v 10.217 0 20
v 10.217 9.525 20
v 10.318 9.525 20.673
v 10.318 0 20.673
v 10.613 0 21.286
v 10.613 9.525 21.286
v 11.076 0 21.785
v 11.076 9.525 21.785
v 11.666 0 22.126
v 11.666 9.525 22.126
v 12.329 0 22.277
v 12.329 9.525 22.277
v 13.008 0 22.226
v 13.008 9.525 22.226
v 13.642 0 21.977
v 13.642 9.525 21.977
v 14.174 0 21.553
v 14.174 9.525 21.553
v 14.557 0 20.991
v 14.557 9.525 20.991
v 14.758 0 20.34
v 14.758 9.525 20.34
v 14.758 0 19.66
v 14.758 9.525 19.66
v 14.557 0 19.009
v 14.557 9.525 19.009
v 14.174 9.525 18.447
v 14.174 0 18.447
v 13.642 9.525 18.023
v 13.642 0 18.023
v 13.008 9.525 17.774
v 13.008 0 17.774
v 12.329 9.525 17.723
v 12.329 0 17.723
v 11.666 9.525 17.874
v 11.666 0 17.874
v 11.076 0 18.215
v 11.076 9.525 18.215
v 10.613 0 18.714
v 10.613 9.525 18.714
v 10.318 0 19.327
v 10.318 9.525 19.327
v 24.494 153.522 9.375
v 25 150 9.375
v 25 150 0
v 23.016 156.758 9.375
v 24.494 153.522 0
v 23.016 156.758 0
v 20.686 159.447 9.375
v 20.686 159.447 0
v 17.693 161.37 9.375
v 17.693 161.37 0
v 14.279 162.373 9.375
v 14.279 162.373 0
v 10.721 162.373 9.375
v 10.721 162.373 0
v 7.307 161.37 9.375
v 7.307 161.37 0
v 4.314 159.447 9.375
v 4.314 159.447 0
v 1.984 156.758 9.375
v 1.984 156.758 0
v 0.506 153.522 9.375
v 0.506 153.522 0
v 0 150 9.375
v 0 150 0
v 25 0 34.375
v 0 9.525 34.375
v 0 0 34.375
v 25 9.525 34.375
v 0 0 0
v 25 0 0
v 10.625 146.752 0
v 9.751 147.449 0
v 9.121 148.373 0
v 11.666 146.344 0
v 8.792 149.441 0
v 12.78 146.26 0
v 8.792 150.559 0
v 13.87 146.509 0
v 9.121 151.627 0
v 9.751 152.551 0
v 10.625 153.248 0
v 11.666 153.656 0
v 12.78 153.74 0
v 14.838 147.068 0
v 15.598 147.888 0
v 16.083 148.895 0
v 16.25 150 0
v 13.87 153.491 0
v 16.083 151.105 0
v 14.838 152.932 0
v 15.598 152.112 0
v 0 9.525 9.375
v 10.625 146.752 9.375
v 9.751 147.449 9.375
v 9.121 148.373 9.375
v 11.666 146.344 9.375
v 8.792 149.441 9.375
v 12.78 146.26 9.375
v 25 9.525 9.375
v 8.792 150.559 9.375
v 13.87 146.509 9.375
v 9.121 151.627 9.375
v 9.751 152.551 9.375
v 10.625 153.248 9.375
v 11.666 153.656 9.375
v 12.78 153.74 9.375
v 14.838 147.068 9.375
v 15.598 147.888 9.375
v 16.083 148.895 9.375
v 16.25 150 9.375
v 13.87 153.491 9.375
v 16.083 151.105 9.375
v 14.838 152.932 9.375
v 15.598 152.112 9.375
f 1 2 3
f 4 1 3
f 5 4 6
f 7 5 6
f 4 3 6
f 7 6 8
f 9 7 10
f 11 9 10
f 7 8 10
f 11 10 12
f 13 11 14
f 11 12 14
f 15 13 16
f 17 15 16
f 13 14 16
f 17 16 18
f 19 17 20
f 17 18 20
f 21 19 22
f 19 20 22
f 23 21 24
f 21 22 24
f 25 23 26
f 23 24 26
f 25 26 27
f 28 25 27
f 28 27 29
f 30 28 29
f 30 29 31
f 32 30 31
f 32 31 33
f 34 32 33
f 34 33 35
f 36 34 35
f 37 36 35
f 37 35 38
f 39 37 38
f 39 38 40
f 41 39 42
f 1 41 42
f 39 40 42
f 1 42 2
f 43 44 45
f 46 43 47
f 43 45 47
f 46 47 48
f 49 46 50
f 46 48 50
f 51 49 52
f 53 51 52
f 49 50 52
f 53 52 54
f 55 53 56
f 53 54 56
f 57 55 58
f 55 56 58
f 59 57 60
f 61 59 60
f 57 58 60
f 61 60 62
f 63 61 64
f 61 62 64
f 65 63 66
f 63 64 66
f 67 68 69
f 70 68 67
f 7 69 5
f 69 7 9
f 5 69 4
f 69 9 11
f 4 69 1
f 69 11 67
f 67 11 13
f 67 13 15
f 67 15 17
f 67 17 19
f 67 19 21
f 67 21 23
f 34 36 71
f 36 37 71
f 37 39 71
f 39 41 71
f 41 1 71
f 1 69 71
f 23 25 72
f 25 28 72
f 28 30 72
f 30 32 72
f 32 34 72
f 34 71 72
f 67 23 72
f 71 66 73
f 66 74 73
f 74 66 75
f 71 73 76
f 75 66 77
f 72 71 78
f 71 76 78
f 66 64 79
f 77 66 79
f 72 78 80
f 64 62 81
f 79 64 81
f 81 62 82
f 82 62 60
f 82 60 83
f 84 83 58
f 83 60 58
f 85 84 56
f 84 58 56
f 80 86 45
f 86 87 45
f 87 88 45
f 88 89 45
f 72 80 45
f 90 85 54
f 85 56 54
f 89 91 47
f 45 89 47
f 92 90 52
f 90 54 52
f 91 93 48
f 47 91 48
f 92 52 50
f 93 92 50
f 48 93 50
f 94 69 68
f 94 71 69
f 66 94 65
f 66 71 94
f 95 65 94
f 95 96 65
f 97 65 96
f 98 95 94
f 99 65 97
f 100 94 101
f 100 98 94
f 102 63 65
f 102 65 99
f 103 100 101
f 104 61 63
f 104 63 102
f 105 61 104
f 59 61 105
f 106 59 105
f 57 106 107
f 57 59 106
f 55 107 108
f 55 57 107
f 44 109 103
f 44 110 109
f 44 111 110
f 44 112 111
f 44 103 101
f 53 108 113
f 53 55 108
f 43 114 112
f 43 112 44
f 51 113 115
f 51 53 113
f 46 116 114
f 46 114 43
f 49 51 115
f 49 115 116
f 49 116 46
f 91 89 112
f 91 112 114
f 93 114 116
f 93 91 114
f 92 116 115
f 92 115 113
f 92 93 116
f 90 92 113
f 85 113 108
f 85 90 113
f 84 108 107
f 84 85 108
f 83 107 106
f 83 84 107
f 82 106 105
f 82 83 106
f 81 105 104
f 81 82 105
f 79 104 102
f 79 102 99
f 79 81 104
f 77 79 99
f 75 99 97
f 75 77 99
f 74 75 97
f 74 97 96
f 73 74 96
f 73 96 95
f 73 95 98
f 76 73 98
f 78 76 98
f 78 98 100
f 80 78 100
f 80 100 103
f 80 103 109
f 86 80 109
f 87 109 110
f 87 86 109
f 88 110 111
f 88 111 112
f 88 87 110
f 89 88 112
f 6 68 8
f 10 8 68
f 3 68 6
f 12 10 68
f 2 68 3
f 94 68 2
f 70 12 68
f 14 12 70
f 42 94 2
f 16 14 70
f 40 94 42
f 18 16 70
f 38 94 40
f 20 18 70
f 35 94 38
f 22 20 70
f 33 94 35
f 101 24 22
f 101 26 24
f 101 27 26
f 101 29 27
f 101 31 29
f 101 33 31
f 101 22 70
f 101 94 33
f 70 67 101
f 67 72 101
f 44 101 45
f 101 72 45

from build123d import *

# Parameters (mm, degrees)
F0_R     = 3.75
F1_DEPTH = 9.375
F2_W     = 25
F2_H     = 9.525
F3_DEPTH = 25
F4_R     = 2.283414
F5_DEPTH = 9.525


with BuildPart() as f1:
    # F0 (on Top) → F1 (new body)
    with BuildSketch(Plane.XY):
        with BuildLine():
            Line((0, 150), (0, 0))
            Line((0, 0), (25, 0))
            Line((25, 0), (25, 150))
            ThreePointArc((25, 150), (12.5, 162.5), (0, 150))
        make_face()
        with Locations((12.5, 150)):
            Circle(F0_R, mode=Mode.SUBTRACT)
    extrude(amount=F1_DEPTH)

    # F2 (on face) → F3 (join)
    with BuildSketch(Plane.XY.offset(9.375)):
        with Locations((12.5, 4.7625)):
            Rectangle(F2_W, F2_H)
    extrude(amount=F3_DEPTH)

    # F4 (on face) → F5 (cut, through all)
    with BuildSketch(Plane(origin=(0, 9.525, 0), x_dir=(-1, 0, 0), z_dir=(0, 1, 0))):
        with Locations((-12.5, 20)):
            Circle(F4_R)
    extrude(amount=-F5_DEPTH, mode=Mode.SUBTRACT)


solid = f1.part
